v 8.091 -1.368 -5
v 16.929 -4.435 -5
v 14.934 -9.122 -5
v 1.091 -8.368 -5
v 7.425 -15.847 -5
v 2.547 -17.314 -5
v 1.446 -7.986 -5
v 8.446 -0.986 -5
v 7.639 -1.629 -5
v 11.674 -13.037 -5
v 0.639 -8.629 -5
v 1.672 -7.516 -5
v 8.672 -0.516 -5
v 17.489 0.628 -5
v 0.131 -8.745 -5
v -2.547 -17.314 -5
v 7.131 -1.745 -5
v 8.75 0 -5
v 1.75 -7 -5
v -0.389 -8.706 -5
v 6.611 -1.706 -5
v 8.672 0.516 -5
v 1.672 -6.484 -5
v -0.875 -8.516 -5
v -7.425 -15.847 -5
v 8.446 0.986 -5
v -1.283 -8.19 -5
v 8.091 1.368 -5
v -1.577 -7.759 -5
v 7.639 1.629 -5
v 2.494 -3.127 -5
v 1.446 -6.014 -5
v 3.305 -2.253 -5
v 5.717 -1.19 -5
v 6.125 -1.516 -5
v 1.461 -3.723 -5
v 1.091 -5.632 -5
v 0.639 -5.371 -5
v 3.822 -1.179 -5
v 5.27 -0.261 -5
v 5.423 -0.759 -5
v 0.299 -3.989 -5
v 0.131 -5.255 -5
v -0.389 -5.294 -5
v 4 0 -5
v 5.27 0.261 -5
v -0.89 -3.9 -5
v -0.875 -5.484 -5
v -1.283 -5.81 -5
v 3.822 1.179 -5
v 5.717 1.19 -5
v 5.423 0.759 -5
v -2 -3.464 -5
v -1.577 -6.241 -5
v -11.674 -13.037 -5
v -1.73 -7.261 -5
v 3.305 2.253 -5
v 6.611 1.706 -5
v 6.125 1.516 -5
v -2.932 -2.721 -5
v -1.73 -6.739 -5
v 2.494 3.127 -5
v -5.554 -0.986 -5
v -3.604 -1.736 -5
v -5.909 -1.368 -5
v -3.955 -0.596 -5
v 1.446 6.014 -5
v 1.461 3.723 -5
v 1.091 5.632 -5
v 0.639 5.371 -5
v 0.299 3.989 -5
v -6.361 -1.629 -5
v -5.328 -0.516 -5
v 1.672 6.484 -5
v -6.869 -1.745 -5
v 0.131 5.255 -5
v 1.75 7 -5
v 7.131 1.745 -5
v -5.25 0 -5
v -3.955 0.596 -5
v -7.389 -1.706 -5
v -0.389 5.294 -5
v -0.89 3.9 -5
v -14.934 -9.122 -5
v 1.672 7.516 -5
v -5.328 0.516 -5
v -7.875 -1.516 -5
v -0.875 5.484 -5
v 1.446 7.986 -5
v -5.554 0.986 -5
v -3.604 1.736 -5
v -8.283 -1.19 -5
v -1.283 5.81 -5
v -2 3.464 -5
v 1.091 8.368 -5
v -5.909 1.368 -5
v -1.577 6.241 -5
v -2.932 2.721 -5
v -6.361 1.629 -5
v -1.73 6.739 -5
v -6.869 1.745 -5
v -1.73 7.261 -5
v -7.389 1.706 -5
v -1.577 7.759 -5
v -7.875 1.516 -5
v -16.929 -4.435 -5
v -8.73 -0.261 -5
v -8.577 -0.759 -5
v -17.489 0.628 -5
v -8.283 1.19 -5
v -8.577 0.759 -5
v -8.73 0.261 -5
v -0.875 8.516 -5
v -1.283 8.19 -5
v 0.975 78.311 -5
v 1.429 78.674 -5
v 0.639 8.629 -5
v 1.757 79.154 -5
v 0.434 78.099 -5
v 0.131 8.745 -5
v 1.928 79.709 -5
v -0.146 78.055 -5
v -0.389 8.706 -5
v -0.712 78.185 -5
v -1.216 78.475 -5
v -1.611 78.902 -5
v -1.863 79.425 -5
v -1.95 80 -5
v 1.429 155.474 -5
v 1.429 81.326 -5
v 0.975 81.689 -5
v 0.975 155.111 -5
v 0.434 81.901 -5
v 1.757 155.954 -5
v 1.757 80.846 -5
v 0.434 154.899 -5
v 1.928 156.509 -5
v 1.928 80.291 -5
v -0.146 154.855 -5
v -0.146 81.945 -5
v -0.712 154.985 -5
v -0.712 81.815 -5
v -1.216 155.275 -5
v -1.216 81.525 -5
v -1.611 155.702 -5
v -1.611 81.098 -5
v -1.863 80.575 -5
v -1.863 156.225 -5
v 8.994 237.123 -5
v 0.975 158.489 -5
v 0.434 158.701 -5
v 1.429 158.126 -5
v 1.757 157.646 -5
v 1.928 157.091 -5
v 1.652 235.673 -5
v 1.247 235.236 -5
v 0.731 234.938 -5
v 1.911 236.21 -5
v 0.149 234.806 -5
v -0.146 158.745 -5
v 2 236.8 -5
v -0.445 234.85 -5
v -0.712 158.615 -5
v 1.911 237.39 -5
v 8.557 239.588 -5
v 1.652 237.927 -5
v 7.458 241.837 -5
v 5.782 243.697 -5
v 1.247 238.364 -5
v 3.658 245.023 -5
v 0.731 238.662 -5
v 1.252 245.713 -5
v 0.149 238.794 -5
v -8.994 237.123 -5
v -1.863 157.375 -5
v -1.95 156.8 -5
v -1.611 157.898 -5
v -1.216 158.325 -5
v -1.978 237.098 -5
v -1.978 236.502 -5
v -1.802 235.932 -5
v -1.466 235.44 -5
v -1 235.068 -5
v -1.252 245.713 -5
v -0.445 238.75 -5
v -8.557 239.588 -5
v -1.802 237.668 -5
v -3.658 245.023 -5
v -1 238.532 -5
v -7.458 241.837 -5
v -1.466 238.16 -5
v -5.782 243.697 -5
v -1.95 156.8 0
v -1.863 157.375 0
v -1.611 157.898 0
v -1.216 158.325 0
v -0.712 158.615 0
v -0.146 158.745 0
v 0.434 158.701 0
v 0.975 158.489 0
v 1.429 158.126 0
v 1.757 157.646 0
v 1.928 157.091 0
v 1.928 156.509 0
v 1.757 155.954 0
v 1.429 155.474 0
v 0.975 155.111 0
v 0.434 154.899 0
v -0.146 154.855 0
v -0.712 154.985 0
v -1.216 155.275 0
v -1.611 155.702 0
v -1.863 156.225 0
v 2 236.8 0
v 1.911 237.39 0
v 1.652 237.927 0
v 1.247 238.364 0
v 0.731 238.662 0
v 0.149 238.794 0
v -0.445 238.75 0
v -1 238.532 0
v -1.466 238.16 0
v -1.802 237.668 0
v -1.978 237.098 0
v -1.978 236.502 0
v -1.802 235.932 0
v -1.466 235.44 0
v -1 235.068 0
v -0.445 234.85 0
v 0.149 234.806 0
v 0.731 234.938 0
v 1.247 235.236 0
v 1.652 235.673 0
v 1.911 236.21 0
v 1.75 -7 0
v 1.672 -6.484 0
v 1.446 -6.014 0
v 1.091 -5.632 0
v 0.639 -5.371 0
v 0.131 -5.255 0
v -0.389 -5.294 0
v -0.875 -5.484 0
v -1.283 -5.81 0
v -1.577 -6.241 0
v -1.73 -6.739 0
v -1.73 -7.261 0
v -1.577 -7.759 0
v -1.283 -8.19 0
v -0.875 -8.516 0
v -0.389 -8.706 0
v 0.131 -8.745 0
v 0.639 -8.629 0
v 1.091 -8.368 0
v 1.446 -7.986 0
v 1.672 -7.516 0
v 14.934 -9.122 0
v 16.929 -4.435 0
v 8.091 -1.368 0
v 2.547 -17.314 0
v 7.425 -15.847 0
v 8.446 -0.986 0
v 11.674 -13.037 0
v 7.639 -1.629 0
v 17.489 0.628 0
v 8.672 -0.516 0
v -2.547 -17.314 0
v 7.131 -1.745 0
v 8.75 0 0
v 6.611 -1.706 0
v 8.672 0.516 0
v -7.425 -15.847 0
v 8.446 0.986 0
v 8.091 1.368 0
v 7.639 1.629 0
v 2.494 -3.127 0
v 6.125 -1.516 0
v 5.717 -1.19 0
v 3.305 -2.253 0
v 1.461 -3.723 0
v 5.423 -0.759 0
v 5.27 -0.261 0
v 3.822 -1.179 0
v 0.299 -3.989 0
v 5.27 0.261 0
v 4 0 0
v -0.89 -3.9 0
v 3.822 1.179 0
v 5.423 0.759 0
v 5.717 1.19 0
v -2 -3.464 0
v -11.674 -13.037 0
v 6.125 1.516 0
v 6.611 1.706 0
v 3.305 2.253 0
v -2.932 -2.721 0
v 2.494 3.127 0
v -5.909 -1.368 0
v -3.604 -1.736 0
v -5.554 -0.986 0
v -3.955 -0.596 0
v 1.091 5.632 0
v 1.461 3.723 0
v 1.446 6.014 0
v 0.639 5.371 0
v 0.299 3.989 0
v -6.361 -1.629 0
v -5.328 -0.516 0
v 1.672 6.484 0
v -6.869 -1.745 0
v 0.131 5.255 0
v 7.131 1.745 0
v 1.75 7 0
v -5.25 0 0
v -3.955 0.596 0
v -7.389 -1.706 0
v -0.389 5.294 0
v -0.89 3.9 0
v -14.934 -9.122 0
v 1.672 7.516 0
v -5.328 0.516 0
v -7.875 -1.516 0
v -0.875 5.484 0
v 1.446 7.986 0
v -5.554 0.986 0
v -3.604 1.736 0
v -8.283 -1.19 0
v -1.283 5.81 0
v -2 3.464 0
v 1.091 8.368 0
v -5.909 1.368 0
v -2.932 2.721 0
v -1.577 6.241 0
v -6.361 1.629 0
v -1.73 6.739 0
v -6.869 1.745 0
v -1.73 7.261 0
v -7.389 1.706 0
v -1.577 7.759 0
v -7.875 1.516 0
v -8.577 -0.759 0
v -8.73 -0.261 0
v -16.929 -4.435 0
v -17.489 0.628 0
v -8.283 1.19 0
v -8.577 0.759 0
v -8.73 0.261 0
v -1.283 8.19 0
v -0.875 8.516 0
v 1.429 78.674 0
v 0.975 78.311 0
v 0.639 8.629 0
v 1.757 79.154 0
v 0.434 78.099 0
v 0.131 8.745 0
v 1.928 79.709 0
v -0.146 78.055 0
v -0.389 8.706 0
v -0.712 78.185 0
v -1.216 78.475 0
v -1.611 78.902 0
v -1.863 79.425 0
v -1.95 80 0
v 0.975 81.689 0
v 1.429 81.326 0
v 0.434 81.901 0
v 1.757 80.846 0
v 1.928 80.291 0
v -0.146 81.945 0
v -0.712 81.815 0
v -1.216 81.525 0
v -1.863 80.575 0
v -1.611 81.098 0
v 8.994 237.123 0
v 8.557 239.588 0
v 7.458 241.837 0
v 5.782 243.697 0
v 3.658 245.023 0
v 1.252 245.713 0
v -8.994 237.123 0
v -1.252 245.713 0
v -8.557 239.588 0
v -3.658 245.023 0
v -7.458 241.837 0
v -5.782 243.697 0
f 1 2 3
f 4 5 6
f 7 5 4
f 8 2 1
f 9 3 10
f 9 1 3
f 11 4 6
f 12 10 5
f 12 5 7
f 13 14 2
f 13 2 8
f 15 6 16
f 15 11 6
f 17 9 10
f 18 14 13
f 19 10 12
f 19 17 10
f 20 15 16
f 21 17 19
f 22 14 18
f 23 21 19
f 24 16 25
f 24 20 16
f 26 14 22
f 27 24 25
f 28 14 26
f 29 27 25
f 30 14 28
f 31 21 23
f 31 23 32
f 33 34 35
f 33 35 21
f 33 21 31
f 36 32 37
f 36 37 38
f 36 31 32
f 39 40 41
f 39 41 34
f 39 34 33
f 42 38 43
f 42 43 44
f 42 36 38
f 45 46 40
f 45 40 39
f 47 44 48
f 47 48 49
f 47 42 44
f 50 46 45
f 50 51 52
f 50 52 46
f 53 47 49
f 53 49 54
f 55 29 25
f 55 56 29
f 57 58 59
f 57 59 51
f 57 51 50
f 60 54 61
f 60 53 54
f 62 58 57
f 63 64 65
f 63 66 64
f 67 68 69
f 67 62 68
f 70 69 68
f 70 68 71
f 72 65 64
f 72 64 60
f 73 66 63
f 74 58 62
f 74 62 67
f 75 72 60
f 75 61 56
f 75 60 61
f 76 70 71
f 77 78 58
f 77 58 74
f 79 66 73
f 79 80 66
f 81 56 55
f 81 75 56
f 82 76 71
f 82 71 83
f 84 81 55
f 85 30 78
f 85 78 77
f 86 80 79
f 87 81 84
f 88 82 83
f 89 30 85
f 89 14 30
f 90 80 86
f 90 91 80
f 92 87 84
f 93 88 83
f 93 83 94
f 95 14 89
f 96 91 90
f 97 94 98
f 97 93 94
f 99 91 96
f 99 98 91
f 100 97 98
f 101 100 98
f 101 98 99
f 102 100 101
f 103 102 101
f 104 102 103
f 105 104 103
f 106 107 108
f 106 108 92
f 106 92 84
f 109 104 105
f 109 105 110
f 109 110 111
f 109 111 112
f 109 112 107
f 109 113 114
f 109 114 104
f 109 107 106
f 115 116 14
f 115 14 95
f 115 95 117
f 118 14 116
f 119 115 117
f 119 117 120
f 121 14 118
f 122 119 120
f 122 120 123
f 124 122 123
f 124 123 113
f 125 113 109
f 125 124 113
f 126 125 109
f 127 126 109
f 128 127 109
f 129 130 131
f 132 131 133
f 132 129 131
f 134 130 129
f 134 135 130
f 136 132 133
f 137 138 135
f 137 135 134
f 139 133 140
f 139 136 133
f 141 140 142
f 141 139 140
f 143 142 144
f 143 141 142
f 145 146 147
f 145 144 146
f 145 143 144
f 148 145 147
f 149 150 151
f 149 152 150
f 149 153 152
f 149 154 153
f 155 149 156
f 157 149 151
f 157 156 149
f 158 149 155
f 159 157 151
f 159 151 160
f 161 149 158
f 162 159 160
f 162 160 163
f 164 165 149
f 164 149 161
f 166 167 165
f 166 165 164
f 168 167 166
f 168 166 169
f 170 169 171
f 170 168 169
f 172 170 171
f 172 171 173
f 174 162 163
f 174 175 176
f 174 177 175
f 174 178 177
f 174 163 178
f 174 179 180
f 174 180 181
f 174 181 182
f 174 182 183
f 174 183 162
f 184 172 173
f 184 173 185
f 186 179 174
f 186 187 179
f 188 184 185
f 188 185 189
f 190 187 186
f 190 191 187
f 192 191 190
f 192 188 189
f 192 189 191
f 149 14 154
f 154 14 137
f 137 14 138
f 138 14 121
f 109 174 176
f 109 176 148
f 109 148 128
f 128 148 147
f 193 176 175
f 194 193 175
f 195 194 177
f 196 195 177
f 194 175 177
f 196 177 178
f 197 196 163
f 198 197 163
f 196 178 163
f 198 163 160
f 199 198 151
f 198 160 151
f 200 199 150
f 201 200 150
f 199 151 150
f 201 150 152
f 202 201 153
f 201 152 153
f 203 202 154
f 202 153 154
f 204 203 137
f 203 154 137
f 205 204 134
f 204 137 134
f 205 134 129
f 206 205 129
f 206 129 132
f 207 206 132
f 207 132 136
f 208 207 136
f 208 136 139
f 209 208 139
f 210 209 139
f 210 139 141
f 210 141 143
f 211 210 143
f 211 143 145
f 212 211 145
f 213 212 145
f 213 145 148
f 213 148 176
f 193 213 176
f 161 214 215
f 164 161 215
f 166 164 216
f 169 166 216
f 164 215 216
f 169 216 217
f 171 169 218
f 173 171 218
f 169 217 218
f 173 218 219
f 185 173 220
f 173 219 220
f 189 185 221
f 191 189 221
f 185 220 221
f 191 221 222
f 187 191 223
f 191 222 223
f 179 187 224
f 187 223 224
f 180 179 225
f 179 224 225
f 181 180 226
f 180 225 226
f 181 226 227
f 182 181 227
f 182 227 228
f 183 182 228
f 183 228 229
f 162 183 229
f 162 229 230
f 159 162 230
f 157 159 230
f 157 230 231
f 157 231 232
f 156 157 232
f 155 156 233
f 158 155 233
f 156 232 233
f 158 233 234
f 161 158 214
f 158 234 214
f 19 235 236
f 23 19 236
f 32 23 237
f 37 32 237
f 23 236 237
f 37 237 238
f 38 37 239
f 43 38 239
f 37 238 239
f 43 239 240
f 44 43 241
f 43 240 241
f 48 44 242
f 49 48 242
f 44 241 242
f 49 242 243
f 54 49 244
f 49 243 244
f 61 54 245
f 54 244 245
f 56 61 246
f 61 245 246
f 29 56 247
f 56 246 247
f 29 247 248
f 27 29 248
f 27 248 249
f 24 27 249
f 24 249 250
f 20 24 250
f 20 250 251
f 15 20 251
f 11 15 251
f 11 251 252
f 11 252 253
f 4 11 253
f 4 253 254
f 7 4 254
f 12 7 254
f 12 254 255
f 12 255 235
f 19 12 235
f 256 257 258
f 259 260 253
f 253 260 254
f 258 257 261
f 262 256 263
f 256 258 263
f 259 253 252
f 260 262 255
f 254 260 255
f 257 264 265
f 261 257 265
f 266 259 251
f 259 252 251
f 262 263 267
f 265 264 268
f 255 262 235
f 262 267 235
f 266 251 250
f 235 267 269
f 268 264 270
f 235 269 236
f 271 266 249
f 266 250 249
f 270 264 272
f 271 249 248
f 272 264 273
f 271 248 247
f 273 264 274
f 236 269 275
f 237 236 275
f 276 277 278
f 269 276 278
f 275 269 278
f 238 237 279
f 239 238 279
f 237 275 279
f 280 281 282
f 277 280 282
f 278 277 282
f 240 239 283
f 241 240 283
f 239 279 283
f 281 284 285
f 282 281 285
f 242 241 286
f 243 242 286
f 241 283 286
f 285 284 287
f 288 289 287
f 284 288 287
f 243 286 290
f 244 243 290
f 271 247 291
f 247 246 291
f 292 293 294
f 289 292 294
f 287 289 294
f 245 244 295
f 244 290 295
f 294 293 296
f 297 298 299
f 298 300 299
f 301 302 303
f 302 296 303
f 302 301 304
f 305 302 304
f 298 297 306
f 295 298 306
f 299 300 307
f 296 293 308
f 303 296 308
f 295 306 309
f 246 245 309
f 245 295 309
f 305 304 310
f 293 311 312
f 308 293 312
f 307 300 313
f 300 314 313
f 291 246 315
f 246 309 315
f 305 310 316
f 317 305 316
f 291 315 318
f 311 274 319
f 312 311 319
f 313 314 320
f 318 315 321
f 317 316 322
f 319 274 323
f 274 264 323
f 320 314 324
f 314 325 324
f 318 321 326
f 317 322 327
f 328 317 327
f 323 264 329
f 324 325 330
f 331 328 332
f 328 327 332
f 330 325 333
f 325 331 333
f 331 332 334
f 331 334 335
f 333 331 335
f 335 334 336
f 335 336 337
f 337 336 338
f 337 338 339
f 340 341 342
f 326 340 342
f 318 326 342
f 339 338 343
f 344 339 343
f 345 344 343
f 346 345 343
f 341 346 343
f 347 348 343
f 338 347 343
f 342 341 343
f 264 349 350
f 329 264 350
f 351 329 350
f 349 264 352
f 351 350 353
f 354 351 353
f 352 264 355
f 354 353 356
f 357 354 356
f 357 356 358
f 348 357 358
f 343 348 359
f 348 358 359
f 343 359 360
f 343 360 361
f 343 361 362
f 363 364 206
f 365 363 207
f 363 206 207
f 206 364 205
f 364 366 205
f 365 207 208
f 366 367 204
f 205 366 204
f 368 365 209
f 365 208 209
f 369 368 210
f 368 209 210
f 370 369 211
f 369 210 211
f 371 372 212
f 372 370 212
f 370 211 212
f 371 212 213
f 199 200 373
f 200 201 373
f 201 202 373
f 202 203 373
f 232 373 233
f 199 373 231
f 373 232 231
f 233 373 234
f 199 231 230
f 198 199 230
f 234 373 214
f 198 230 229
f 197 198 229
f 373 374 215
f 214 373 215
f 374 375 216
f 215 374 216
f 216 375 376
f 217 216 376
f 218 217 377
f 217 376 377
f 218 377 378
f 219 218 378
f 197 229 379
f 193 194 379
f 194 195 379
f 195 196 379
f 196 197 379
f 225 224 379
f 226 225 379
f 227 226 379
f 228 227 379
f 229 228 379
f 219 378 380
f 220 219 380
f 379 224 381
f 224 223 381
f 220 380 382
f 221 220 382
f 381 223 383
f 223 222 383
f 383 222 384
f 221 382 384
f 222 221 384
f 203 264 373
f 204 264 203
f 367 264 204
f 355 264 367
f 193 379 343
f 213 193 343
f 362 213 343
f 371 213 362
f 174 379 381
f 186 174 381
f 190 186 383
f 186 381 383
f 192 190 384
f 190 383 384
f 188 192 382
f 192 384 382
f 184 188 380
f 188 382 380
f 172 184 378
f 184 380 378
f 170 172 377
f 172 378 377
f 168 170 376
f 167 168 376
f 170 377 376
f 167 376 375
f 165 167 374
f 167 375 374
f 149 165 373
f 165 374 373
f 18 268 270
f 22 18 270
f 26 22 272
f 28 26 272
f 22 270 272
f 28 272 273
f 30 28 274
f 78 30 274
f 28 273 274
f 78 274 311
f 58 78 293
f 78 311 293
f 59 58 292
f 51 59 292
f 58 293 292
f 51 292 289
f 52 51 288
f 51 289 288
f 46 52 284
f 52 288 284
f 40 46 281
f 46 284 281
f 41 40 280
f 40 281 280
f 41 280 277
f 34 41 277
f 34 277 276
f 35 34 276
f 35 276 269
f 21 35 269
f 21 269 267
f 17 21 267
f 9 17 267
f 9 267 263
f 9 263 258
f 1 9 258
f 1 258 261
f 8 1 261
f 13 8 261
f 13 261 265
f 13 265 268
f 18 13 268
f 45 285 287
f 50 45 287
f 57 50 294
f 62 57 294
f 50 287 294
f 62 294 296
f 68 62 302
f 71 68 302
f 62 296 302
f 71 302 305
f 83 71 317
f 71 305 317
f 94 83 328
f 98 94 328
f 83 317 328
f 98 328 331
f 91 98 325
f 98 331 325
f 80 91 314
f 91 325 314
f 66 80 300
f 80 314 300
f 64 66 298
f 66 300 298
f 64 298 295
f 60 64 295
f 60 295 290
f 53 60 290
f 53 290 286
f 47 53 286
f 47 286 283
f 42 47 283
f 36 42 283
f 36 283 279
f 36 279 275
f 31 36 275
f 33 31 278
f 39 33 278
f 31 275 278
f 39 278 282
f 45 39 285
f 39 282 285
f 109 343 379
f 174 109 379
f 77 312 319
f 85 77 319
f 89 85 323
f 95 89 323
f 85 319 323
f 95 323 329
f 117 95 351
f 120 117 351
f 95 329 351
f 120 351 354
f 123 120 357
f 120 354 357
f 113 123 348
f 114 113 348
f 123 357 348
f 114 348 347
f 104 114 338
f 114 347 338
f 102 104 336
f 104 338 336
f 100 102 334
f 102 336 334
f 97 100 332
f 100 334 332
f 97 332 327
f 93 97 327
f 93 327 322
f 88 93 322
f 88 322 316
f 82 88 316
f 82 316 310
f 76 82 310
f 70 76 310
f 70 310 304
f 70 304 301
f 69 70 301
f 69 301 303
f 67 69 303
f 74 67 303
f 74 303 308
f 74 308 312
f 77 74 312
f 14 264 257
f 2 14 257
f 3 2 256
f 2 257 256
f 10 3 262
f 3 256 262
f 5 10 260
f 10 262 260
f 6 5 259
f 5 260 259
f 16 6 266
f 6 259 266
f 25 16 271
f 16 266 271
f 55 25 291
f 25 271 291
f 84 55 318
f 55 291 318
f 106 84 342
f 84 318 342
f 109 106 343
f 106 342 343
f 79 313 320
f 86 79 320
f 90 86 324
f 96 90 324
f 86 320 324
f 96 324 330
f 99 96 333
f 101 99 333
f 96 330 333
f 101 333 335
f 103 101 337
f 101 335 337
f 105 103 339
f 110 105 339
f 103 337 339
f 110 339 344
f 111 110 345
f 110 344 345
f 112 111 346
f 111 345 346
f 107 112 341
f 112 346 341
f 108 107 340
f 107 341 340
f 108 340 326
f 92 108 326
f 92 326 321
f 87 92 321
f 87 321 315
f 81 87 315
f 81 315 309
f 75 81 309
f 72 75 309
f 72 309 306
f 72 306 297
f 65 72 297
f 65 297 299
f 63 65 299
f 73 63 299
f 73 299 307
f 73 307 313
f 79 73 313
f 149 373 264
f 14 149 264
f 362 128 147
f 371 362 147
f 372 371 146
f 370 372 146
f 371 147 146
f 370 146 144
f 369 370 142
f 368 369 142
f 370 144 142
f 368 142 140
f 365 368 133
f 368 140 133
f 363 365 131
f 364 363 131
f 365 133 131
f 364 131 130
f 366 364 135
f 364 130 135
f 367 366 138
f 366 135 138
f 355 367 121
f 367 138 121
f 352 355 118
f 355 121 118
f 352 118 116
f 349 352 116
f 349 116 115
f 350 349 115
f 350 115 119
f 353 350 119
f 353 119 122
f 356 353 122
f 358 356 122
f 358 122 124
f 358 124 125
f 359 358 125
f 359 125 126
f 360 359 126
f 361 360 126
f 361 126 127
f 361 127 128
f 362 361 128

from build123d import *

# Parameters (mm, degrees)
SKETCH7_R                = 4
SKETCH7_R_2              = 2
BOSS_EXTRUDE1_DEPTH      = 5
HOLE_WIZARD_M3_5_1_D     = 3.9
HOLE_WIZARD_M3_5_1_DEPTH = 10
HOLE_WIZARD_M3_5_1_TIP   = 1.171678207
SKETCH_4_R               = 1.75
CUT_EXTRUDE_1_DEPTH      = 10


with BuildPart() as part:
    # Sketch7 → Boss-Extrude1 (new body)
    with BuildSketch(Plane.XY):
        with BuildLine():
            Line((8.994200014, 237.123057432), (17.48872225, 0.62816723))
            ThreePointArc((17.48872225, 0.62816723), (0, -17.5), (-17.48872225, 0.62816723))
            Line((-17.48872225, 0.62816723), (-8.994200014, 237.123057432))
            ThreePointArc((-8.994200014, 237.123057432), (0, 245.8), (8.994200014, 237.123057432))
        make_face()
        Circle(SKETCH7_R, mode=Mode.SUBTRACT)
        with Locations((0, 236.8)):
            Circle(SKETCH7_R_2, mode=Mode.SUBTRACT)
    extrude(amount=-BOSS_EXTRUDE1_DEPTH)

    # M3.5 间隙孔1
    with Locations(Plane(origin=(0, 156.8, 0), x_dir=(1, 0, 0), z_dir=(0, 0, 1))):
        with Locations((0, 0), (0, -76.8)):
            Hole(HOLE_WIZARD_M3_5_1_D / 2, depth=HOLE_WIZARD_M3_5_1_DEPTH)
            with Locations((0, 0, -(HOLE_WIZARD_M3_5_1_DEPTH + HOLE_WIZARD_M3_5_1_TIP / 2))):  # 118° drill point
                Cone(0, HOLE_WIZARD_M3_5_1_D / 2, HOLE_WIZARD_M3_5_1_TIP, mode=Mode.SUBTRACT)

    # 草图4 → 切除-拉伸1 (cut)
    with BuildSketch(Plane.XY):
        with Locations((7, 0)):
            Circle(SKETCH_4_R)
        with Locations((0, 7)):
            Circle(SKETCH_4_R)
        with Locations((0, -7)):
            Circle(SKETCH_4_R)
        with Locations((-7, 0)):
            Circle(SKETCH_4_R)
    extrude(amount=-CUT_EXTRUDE_1_DEPTH, mode=Mode.SUBTRACT)


solid = part.part
